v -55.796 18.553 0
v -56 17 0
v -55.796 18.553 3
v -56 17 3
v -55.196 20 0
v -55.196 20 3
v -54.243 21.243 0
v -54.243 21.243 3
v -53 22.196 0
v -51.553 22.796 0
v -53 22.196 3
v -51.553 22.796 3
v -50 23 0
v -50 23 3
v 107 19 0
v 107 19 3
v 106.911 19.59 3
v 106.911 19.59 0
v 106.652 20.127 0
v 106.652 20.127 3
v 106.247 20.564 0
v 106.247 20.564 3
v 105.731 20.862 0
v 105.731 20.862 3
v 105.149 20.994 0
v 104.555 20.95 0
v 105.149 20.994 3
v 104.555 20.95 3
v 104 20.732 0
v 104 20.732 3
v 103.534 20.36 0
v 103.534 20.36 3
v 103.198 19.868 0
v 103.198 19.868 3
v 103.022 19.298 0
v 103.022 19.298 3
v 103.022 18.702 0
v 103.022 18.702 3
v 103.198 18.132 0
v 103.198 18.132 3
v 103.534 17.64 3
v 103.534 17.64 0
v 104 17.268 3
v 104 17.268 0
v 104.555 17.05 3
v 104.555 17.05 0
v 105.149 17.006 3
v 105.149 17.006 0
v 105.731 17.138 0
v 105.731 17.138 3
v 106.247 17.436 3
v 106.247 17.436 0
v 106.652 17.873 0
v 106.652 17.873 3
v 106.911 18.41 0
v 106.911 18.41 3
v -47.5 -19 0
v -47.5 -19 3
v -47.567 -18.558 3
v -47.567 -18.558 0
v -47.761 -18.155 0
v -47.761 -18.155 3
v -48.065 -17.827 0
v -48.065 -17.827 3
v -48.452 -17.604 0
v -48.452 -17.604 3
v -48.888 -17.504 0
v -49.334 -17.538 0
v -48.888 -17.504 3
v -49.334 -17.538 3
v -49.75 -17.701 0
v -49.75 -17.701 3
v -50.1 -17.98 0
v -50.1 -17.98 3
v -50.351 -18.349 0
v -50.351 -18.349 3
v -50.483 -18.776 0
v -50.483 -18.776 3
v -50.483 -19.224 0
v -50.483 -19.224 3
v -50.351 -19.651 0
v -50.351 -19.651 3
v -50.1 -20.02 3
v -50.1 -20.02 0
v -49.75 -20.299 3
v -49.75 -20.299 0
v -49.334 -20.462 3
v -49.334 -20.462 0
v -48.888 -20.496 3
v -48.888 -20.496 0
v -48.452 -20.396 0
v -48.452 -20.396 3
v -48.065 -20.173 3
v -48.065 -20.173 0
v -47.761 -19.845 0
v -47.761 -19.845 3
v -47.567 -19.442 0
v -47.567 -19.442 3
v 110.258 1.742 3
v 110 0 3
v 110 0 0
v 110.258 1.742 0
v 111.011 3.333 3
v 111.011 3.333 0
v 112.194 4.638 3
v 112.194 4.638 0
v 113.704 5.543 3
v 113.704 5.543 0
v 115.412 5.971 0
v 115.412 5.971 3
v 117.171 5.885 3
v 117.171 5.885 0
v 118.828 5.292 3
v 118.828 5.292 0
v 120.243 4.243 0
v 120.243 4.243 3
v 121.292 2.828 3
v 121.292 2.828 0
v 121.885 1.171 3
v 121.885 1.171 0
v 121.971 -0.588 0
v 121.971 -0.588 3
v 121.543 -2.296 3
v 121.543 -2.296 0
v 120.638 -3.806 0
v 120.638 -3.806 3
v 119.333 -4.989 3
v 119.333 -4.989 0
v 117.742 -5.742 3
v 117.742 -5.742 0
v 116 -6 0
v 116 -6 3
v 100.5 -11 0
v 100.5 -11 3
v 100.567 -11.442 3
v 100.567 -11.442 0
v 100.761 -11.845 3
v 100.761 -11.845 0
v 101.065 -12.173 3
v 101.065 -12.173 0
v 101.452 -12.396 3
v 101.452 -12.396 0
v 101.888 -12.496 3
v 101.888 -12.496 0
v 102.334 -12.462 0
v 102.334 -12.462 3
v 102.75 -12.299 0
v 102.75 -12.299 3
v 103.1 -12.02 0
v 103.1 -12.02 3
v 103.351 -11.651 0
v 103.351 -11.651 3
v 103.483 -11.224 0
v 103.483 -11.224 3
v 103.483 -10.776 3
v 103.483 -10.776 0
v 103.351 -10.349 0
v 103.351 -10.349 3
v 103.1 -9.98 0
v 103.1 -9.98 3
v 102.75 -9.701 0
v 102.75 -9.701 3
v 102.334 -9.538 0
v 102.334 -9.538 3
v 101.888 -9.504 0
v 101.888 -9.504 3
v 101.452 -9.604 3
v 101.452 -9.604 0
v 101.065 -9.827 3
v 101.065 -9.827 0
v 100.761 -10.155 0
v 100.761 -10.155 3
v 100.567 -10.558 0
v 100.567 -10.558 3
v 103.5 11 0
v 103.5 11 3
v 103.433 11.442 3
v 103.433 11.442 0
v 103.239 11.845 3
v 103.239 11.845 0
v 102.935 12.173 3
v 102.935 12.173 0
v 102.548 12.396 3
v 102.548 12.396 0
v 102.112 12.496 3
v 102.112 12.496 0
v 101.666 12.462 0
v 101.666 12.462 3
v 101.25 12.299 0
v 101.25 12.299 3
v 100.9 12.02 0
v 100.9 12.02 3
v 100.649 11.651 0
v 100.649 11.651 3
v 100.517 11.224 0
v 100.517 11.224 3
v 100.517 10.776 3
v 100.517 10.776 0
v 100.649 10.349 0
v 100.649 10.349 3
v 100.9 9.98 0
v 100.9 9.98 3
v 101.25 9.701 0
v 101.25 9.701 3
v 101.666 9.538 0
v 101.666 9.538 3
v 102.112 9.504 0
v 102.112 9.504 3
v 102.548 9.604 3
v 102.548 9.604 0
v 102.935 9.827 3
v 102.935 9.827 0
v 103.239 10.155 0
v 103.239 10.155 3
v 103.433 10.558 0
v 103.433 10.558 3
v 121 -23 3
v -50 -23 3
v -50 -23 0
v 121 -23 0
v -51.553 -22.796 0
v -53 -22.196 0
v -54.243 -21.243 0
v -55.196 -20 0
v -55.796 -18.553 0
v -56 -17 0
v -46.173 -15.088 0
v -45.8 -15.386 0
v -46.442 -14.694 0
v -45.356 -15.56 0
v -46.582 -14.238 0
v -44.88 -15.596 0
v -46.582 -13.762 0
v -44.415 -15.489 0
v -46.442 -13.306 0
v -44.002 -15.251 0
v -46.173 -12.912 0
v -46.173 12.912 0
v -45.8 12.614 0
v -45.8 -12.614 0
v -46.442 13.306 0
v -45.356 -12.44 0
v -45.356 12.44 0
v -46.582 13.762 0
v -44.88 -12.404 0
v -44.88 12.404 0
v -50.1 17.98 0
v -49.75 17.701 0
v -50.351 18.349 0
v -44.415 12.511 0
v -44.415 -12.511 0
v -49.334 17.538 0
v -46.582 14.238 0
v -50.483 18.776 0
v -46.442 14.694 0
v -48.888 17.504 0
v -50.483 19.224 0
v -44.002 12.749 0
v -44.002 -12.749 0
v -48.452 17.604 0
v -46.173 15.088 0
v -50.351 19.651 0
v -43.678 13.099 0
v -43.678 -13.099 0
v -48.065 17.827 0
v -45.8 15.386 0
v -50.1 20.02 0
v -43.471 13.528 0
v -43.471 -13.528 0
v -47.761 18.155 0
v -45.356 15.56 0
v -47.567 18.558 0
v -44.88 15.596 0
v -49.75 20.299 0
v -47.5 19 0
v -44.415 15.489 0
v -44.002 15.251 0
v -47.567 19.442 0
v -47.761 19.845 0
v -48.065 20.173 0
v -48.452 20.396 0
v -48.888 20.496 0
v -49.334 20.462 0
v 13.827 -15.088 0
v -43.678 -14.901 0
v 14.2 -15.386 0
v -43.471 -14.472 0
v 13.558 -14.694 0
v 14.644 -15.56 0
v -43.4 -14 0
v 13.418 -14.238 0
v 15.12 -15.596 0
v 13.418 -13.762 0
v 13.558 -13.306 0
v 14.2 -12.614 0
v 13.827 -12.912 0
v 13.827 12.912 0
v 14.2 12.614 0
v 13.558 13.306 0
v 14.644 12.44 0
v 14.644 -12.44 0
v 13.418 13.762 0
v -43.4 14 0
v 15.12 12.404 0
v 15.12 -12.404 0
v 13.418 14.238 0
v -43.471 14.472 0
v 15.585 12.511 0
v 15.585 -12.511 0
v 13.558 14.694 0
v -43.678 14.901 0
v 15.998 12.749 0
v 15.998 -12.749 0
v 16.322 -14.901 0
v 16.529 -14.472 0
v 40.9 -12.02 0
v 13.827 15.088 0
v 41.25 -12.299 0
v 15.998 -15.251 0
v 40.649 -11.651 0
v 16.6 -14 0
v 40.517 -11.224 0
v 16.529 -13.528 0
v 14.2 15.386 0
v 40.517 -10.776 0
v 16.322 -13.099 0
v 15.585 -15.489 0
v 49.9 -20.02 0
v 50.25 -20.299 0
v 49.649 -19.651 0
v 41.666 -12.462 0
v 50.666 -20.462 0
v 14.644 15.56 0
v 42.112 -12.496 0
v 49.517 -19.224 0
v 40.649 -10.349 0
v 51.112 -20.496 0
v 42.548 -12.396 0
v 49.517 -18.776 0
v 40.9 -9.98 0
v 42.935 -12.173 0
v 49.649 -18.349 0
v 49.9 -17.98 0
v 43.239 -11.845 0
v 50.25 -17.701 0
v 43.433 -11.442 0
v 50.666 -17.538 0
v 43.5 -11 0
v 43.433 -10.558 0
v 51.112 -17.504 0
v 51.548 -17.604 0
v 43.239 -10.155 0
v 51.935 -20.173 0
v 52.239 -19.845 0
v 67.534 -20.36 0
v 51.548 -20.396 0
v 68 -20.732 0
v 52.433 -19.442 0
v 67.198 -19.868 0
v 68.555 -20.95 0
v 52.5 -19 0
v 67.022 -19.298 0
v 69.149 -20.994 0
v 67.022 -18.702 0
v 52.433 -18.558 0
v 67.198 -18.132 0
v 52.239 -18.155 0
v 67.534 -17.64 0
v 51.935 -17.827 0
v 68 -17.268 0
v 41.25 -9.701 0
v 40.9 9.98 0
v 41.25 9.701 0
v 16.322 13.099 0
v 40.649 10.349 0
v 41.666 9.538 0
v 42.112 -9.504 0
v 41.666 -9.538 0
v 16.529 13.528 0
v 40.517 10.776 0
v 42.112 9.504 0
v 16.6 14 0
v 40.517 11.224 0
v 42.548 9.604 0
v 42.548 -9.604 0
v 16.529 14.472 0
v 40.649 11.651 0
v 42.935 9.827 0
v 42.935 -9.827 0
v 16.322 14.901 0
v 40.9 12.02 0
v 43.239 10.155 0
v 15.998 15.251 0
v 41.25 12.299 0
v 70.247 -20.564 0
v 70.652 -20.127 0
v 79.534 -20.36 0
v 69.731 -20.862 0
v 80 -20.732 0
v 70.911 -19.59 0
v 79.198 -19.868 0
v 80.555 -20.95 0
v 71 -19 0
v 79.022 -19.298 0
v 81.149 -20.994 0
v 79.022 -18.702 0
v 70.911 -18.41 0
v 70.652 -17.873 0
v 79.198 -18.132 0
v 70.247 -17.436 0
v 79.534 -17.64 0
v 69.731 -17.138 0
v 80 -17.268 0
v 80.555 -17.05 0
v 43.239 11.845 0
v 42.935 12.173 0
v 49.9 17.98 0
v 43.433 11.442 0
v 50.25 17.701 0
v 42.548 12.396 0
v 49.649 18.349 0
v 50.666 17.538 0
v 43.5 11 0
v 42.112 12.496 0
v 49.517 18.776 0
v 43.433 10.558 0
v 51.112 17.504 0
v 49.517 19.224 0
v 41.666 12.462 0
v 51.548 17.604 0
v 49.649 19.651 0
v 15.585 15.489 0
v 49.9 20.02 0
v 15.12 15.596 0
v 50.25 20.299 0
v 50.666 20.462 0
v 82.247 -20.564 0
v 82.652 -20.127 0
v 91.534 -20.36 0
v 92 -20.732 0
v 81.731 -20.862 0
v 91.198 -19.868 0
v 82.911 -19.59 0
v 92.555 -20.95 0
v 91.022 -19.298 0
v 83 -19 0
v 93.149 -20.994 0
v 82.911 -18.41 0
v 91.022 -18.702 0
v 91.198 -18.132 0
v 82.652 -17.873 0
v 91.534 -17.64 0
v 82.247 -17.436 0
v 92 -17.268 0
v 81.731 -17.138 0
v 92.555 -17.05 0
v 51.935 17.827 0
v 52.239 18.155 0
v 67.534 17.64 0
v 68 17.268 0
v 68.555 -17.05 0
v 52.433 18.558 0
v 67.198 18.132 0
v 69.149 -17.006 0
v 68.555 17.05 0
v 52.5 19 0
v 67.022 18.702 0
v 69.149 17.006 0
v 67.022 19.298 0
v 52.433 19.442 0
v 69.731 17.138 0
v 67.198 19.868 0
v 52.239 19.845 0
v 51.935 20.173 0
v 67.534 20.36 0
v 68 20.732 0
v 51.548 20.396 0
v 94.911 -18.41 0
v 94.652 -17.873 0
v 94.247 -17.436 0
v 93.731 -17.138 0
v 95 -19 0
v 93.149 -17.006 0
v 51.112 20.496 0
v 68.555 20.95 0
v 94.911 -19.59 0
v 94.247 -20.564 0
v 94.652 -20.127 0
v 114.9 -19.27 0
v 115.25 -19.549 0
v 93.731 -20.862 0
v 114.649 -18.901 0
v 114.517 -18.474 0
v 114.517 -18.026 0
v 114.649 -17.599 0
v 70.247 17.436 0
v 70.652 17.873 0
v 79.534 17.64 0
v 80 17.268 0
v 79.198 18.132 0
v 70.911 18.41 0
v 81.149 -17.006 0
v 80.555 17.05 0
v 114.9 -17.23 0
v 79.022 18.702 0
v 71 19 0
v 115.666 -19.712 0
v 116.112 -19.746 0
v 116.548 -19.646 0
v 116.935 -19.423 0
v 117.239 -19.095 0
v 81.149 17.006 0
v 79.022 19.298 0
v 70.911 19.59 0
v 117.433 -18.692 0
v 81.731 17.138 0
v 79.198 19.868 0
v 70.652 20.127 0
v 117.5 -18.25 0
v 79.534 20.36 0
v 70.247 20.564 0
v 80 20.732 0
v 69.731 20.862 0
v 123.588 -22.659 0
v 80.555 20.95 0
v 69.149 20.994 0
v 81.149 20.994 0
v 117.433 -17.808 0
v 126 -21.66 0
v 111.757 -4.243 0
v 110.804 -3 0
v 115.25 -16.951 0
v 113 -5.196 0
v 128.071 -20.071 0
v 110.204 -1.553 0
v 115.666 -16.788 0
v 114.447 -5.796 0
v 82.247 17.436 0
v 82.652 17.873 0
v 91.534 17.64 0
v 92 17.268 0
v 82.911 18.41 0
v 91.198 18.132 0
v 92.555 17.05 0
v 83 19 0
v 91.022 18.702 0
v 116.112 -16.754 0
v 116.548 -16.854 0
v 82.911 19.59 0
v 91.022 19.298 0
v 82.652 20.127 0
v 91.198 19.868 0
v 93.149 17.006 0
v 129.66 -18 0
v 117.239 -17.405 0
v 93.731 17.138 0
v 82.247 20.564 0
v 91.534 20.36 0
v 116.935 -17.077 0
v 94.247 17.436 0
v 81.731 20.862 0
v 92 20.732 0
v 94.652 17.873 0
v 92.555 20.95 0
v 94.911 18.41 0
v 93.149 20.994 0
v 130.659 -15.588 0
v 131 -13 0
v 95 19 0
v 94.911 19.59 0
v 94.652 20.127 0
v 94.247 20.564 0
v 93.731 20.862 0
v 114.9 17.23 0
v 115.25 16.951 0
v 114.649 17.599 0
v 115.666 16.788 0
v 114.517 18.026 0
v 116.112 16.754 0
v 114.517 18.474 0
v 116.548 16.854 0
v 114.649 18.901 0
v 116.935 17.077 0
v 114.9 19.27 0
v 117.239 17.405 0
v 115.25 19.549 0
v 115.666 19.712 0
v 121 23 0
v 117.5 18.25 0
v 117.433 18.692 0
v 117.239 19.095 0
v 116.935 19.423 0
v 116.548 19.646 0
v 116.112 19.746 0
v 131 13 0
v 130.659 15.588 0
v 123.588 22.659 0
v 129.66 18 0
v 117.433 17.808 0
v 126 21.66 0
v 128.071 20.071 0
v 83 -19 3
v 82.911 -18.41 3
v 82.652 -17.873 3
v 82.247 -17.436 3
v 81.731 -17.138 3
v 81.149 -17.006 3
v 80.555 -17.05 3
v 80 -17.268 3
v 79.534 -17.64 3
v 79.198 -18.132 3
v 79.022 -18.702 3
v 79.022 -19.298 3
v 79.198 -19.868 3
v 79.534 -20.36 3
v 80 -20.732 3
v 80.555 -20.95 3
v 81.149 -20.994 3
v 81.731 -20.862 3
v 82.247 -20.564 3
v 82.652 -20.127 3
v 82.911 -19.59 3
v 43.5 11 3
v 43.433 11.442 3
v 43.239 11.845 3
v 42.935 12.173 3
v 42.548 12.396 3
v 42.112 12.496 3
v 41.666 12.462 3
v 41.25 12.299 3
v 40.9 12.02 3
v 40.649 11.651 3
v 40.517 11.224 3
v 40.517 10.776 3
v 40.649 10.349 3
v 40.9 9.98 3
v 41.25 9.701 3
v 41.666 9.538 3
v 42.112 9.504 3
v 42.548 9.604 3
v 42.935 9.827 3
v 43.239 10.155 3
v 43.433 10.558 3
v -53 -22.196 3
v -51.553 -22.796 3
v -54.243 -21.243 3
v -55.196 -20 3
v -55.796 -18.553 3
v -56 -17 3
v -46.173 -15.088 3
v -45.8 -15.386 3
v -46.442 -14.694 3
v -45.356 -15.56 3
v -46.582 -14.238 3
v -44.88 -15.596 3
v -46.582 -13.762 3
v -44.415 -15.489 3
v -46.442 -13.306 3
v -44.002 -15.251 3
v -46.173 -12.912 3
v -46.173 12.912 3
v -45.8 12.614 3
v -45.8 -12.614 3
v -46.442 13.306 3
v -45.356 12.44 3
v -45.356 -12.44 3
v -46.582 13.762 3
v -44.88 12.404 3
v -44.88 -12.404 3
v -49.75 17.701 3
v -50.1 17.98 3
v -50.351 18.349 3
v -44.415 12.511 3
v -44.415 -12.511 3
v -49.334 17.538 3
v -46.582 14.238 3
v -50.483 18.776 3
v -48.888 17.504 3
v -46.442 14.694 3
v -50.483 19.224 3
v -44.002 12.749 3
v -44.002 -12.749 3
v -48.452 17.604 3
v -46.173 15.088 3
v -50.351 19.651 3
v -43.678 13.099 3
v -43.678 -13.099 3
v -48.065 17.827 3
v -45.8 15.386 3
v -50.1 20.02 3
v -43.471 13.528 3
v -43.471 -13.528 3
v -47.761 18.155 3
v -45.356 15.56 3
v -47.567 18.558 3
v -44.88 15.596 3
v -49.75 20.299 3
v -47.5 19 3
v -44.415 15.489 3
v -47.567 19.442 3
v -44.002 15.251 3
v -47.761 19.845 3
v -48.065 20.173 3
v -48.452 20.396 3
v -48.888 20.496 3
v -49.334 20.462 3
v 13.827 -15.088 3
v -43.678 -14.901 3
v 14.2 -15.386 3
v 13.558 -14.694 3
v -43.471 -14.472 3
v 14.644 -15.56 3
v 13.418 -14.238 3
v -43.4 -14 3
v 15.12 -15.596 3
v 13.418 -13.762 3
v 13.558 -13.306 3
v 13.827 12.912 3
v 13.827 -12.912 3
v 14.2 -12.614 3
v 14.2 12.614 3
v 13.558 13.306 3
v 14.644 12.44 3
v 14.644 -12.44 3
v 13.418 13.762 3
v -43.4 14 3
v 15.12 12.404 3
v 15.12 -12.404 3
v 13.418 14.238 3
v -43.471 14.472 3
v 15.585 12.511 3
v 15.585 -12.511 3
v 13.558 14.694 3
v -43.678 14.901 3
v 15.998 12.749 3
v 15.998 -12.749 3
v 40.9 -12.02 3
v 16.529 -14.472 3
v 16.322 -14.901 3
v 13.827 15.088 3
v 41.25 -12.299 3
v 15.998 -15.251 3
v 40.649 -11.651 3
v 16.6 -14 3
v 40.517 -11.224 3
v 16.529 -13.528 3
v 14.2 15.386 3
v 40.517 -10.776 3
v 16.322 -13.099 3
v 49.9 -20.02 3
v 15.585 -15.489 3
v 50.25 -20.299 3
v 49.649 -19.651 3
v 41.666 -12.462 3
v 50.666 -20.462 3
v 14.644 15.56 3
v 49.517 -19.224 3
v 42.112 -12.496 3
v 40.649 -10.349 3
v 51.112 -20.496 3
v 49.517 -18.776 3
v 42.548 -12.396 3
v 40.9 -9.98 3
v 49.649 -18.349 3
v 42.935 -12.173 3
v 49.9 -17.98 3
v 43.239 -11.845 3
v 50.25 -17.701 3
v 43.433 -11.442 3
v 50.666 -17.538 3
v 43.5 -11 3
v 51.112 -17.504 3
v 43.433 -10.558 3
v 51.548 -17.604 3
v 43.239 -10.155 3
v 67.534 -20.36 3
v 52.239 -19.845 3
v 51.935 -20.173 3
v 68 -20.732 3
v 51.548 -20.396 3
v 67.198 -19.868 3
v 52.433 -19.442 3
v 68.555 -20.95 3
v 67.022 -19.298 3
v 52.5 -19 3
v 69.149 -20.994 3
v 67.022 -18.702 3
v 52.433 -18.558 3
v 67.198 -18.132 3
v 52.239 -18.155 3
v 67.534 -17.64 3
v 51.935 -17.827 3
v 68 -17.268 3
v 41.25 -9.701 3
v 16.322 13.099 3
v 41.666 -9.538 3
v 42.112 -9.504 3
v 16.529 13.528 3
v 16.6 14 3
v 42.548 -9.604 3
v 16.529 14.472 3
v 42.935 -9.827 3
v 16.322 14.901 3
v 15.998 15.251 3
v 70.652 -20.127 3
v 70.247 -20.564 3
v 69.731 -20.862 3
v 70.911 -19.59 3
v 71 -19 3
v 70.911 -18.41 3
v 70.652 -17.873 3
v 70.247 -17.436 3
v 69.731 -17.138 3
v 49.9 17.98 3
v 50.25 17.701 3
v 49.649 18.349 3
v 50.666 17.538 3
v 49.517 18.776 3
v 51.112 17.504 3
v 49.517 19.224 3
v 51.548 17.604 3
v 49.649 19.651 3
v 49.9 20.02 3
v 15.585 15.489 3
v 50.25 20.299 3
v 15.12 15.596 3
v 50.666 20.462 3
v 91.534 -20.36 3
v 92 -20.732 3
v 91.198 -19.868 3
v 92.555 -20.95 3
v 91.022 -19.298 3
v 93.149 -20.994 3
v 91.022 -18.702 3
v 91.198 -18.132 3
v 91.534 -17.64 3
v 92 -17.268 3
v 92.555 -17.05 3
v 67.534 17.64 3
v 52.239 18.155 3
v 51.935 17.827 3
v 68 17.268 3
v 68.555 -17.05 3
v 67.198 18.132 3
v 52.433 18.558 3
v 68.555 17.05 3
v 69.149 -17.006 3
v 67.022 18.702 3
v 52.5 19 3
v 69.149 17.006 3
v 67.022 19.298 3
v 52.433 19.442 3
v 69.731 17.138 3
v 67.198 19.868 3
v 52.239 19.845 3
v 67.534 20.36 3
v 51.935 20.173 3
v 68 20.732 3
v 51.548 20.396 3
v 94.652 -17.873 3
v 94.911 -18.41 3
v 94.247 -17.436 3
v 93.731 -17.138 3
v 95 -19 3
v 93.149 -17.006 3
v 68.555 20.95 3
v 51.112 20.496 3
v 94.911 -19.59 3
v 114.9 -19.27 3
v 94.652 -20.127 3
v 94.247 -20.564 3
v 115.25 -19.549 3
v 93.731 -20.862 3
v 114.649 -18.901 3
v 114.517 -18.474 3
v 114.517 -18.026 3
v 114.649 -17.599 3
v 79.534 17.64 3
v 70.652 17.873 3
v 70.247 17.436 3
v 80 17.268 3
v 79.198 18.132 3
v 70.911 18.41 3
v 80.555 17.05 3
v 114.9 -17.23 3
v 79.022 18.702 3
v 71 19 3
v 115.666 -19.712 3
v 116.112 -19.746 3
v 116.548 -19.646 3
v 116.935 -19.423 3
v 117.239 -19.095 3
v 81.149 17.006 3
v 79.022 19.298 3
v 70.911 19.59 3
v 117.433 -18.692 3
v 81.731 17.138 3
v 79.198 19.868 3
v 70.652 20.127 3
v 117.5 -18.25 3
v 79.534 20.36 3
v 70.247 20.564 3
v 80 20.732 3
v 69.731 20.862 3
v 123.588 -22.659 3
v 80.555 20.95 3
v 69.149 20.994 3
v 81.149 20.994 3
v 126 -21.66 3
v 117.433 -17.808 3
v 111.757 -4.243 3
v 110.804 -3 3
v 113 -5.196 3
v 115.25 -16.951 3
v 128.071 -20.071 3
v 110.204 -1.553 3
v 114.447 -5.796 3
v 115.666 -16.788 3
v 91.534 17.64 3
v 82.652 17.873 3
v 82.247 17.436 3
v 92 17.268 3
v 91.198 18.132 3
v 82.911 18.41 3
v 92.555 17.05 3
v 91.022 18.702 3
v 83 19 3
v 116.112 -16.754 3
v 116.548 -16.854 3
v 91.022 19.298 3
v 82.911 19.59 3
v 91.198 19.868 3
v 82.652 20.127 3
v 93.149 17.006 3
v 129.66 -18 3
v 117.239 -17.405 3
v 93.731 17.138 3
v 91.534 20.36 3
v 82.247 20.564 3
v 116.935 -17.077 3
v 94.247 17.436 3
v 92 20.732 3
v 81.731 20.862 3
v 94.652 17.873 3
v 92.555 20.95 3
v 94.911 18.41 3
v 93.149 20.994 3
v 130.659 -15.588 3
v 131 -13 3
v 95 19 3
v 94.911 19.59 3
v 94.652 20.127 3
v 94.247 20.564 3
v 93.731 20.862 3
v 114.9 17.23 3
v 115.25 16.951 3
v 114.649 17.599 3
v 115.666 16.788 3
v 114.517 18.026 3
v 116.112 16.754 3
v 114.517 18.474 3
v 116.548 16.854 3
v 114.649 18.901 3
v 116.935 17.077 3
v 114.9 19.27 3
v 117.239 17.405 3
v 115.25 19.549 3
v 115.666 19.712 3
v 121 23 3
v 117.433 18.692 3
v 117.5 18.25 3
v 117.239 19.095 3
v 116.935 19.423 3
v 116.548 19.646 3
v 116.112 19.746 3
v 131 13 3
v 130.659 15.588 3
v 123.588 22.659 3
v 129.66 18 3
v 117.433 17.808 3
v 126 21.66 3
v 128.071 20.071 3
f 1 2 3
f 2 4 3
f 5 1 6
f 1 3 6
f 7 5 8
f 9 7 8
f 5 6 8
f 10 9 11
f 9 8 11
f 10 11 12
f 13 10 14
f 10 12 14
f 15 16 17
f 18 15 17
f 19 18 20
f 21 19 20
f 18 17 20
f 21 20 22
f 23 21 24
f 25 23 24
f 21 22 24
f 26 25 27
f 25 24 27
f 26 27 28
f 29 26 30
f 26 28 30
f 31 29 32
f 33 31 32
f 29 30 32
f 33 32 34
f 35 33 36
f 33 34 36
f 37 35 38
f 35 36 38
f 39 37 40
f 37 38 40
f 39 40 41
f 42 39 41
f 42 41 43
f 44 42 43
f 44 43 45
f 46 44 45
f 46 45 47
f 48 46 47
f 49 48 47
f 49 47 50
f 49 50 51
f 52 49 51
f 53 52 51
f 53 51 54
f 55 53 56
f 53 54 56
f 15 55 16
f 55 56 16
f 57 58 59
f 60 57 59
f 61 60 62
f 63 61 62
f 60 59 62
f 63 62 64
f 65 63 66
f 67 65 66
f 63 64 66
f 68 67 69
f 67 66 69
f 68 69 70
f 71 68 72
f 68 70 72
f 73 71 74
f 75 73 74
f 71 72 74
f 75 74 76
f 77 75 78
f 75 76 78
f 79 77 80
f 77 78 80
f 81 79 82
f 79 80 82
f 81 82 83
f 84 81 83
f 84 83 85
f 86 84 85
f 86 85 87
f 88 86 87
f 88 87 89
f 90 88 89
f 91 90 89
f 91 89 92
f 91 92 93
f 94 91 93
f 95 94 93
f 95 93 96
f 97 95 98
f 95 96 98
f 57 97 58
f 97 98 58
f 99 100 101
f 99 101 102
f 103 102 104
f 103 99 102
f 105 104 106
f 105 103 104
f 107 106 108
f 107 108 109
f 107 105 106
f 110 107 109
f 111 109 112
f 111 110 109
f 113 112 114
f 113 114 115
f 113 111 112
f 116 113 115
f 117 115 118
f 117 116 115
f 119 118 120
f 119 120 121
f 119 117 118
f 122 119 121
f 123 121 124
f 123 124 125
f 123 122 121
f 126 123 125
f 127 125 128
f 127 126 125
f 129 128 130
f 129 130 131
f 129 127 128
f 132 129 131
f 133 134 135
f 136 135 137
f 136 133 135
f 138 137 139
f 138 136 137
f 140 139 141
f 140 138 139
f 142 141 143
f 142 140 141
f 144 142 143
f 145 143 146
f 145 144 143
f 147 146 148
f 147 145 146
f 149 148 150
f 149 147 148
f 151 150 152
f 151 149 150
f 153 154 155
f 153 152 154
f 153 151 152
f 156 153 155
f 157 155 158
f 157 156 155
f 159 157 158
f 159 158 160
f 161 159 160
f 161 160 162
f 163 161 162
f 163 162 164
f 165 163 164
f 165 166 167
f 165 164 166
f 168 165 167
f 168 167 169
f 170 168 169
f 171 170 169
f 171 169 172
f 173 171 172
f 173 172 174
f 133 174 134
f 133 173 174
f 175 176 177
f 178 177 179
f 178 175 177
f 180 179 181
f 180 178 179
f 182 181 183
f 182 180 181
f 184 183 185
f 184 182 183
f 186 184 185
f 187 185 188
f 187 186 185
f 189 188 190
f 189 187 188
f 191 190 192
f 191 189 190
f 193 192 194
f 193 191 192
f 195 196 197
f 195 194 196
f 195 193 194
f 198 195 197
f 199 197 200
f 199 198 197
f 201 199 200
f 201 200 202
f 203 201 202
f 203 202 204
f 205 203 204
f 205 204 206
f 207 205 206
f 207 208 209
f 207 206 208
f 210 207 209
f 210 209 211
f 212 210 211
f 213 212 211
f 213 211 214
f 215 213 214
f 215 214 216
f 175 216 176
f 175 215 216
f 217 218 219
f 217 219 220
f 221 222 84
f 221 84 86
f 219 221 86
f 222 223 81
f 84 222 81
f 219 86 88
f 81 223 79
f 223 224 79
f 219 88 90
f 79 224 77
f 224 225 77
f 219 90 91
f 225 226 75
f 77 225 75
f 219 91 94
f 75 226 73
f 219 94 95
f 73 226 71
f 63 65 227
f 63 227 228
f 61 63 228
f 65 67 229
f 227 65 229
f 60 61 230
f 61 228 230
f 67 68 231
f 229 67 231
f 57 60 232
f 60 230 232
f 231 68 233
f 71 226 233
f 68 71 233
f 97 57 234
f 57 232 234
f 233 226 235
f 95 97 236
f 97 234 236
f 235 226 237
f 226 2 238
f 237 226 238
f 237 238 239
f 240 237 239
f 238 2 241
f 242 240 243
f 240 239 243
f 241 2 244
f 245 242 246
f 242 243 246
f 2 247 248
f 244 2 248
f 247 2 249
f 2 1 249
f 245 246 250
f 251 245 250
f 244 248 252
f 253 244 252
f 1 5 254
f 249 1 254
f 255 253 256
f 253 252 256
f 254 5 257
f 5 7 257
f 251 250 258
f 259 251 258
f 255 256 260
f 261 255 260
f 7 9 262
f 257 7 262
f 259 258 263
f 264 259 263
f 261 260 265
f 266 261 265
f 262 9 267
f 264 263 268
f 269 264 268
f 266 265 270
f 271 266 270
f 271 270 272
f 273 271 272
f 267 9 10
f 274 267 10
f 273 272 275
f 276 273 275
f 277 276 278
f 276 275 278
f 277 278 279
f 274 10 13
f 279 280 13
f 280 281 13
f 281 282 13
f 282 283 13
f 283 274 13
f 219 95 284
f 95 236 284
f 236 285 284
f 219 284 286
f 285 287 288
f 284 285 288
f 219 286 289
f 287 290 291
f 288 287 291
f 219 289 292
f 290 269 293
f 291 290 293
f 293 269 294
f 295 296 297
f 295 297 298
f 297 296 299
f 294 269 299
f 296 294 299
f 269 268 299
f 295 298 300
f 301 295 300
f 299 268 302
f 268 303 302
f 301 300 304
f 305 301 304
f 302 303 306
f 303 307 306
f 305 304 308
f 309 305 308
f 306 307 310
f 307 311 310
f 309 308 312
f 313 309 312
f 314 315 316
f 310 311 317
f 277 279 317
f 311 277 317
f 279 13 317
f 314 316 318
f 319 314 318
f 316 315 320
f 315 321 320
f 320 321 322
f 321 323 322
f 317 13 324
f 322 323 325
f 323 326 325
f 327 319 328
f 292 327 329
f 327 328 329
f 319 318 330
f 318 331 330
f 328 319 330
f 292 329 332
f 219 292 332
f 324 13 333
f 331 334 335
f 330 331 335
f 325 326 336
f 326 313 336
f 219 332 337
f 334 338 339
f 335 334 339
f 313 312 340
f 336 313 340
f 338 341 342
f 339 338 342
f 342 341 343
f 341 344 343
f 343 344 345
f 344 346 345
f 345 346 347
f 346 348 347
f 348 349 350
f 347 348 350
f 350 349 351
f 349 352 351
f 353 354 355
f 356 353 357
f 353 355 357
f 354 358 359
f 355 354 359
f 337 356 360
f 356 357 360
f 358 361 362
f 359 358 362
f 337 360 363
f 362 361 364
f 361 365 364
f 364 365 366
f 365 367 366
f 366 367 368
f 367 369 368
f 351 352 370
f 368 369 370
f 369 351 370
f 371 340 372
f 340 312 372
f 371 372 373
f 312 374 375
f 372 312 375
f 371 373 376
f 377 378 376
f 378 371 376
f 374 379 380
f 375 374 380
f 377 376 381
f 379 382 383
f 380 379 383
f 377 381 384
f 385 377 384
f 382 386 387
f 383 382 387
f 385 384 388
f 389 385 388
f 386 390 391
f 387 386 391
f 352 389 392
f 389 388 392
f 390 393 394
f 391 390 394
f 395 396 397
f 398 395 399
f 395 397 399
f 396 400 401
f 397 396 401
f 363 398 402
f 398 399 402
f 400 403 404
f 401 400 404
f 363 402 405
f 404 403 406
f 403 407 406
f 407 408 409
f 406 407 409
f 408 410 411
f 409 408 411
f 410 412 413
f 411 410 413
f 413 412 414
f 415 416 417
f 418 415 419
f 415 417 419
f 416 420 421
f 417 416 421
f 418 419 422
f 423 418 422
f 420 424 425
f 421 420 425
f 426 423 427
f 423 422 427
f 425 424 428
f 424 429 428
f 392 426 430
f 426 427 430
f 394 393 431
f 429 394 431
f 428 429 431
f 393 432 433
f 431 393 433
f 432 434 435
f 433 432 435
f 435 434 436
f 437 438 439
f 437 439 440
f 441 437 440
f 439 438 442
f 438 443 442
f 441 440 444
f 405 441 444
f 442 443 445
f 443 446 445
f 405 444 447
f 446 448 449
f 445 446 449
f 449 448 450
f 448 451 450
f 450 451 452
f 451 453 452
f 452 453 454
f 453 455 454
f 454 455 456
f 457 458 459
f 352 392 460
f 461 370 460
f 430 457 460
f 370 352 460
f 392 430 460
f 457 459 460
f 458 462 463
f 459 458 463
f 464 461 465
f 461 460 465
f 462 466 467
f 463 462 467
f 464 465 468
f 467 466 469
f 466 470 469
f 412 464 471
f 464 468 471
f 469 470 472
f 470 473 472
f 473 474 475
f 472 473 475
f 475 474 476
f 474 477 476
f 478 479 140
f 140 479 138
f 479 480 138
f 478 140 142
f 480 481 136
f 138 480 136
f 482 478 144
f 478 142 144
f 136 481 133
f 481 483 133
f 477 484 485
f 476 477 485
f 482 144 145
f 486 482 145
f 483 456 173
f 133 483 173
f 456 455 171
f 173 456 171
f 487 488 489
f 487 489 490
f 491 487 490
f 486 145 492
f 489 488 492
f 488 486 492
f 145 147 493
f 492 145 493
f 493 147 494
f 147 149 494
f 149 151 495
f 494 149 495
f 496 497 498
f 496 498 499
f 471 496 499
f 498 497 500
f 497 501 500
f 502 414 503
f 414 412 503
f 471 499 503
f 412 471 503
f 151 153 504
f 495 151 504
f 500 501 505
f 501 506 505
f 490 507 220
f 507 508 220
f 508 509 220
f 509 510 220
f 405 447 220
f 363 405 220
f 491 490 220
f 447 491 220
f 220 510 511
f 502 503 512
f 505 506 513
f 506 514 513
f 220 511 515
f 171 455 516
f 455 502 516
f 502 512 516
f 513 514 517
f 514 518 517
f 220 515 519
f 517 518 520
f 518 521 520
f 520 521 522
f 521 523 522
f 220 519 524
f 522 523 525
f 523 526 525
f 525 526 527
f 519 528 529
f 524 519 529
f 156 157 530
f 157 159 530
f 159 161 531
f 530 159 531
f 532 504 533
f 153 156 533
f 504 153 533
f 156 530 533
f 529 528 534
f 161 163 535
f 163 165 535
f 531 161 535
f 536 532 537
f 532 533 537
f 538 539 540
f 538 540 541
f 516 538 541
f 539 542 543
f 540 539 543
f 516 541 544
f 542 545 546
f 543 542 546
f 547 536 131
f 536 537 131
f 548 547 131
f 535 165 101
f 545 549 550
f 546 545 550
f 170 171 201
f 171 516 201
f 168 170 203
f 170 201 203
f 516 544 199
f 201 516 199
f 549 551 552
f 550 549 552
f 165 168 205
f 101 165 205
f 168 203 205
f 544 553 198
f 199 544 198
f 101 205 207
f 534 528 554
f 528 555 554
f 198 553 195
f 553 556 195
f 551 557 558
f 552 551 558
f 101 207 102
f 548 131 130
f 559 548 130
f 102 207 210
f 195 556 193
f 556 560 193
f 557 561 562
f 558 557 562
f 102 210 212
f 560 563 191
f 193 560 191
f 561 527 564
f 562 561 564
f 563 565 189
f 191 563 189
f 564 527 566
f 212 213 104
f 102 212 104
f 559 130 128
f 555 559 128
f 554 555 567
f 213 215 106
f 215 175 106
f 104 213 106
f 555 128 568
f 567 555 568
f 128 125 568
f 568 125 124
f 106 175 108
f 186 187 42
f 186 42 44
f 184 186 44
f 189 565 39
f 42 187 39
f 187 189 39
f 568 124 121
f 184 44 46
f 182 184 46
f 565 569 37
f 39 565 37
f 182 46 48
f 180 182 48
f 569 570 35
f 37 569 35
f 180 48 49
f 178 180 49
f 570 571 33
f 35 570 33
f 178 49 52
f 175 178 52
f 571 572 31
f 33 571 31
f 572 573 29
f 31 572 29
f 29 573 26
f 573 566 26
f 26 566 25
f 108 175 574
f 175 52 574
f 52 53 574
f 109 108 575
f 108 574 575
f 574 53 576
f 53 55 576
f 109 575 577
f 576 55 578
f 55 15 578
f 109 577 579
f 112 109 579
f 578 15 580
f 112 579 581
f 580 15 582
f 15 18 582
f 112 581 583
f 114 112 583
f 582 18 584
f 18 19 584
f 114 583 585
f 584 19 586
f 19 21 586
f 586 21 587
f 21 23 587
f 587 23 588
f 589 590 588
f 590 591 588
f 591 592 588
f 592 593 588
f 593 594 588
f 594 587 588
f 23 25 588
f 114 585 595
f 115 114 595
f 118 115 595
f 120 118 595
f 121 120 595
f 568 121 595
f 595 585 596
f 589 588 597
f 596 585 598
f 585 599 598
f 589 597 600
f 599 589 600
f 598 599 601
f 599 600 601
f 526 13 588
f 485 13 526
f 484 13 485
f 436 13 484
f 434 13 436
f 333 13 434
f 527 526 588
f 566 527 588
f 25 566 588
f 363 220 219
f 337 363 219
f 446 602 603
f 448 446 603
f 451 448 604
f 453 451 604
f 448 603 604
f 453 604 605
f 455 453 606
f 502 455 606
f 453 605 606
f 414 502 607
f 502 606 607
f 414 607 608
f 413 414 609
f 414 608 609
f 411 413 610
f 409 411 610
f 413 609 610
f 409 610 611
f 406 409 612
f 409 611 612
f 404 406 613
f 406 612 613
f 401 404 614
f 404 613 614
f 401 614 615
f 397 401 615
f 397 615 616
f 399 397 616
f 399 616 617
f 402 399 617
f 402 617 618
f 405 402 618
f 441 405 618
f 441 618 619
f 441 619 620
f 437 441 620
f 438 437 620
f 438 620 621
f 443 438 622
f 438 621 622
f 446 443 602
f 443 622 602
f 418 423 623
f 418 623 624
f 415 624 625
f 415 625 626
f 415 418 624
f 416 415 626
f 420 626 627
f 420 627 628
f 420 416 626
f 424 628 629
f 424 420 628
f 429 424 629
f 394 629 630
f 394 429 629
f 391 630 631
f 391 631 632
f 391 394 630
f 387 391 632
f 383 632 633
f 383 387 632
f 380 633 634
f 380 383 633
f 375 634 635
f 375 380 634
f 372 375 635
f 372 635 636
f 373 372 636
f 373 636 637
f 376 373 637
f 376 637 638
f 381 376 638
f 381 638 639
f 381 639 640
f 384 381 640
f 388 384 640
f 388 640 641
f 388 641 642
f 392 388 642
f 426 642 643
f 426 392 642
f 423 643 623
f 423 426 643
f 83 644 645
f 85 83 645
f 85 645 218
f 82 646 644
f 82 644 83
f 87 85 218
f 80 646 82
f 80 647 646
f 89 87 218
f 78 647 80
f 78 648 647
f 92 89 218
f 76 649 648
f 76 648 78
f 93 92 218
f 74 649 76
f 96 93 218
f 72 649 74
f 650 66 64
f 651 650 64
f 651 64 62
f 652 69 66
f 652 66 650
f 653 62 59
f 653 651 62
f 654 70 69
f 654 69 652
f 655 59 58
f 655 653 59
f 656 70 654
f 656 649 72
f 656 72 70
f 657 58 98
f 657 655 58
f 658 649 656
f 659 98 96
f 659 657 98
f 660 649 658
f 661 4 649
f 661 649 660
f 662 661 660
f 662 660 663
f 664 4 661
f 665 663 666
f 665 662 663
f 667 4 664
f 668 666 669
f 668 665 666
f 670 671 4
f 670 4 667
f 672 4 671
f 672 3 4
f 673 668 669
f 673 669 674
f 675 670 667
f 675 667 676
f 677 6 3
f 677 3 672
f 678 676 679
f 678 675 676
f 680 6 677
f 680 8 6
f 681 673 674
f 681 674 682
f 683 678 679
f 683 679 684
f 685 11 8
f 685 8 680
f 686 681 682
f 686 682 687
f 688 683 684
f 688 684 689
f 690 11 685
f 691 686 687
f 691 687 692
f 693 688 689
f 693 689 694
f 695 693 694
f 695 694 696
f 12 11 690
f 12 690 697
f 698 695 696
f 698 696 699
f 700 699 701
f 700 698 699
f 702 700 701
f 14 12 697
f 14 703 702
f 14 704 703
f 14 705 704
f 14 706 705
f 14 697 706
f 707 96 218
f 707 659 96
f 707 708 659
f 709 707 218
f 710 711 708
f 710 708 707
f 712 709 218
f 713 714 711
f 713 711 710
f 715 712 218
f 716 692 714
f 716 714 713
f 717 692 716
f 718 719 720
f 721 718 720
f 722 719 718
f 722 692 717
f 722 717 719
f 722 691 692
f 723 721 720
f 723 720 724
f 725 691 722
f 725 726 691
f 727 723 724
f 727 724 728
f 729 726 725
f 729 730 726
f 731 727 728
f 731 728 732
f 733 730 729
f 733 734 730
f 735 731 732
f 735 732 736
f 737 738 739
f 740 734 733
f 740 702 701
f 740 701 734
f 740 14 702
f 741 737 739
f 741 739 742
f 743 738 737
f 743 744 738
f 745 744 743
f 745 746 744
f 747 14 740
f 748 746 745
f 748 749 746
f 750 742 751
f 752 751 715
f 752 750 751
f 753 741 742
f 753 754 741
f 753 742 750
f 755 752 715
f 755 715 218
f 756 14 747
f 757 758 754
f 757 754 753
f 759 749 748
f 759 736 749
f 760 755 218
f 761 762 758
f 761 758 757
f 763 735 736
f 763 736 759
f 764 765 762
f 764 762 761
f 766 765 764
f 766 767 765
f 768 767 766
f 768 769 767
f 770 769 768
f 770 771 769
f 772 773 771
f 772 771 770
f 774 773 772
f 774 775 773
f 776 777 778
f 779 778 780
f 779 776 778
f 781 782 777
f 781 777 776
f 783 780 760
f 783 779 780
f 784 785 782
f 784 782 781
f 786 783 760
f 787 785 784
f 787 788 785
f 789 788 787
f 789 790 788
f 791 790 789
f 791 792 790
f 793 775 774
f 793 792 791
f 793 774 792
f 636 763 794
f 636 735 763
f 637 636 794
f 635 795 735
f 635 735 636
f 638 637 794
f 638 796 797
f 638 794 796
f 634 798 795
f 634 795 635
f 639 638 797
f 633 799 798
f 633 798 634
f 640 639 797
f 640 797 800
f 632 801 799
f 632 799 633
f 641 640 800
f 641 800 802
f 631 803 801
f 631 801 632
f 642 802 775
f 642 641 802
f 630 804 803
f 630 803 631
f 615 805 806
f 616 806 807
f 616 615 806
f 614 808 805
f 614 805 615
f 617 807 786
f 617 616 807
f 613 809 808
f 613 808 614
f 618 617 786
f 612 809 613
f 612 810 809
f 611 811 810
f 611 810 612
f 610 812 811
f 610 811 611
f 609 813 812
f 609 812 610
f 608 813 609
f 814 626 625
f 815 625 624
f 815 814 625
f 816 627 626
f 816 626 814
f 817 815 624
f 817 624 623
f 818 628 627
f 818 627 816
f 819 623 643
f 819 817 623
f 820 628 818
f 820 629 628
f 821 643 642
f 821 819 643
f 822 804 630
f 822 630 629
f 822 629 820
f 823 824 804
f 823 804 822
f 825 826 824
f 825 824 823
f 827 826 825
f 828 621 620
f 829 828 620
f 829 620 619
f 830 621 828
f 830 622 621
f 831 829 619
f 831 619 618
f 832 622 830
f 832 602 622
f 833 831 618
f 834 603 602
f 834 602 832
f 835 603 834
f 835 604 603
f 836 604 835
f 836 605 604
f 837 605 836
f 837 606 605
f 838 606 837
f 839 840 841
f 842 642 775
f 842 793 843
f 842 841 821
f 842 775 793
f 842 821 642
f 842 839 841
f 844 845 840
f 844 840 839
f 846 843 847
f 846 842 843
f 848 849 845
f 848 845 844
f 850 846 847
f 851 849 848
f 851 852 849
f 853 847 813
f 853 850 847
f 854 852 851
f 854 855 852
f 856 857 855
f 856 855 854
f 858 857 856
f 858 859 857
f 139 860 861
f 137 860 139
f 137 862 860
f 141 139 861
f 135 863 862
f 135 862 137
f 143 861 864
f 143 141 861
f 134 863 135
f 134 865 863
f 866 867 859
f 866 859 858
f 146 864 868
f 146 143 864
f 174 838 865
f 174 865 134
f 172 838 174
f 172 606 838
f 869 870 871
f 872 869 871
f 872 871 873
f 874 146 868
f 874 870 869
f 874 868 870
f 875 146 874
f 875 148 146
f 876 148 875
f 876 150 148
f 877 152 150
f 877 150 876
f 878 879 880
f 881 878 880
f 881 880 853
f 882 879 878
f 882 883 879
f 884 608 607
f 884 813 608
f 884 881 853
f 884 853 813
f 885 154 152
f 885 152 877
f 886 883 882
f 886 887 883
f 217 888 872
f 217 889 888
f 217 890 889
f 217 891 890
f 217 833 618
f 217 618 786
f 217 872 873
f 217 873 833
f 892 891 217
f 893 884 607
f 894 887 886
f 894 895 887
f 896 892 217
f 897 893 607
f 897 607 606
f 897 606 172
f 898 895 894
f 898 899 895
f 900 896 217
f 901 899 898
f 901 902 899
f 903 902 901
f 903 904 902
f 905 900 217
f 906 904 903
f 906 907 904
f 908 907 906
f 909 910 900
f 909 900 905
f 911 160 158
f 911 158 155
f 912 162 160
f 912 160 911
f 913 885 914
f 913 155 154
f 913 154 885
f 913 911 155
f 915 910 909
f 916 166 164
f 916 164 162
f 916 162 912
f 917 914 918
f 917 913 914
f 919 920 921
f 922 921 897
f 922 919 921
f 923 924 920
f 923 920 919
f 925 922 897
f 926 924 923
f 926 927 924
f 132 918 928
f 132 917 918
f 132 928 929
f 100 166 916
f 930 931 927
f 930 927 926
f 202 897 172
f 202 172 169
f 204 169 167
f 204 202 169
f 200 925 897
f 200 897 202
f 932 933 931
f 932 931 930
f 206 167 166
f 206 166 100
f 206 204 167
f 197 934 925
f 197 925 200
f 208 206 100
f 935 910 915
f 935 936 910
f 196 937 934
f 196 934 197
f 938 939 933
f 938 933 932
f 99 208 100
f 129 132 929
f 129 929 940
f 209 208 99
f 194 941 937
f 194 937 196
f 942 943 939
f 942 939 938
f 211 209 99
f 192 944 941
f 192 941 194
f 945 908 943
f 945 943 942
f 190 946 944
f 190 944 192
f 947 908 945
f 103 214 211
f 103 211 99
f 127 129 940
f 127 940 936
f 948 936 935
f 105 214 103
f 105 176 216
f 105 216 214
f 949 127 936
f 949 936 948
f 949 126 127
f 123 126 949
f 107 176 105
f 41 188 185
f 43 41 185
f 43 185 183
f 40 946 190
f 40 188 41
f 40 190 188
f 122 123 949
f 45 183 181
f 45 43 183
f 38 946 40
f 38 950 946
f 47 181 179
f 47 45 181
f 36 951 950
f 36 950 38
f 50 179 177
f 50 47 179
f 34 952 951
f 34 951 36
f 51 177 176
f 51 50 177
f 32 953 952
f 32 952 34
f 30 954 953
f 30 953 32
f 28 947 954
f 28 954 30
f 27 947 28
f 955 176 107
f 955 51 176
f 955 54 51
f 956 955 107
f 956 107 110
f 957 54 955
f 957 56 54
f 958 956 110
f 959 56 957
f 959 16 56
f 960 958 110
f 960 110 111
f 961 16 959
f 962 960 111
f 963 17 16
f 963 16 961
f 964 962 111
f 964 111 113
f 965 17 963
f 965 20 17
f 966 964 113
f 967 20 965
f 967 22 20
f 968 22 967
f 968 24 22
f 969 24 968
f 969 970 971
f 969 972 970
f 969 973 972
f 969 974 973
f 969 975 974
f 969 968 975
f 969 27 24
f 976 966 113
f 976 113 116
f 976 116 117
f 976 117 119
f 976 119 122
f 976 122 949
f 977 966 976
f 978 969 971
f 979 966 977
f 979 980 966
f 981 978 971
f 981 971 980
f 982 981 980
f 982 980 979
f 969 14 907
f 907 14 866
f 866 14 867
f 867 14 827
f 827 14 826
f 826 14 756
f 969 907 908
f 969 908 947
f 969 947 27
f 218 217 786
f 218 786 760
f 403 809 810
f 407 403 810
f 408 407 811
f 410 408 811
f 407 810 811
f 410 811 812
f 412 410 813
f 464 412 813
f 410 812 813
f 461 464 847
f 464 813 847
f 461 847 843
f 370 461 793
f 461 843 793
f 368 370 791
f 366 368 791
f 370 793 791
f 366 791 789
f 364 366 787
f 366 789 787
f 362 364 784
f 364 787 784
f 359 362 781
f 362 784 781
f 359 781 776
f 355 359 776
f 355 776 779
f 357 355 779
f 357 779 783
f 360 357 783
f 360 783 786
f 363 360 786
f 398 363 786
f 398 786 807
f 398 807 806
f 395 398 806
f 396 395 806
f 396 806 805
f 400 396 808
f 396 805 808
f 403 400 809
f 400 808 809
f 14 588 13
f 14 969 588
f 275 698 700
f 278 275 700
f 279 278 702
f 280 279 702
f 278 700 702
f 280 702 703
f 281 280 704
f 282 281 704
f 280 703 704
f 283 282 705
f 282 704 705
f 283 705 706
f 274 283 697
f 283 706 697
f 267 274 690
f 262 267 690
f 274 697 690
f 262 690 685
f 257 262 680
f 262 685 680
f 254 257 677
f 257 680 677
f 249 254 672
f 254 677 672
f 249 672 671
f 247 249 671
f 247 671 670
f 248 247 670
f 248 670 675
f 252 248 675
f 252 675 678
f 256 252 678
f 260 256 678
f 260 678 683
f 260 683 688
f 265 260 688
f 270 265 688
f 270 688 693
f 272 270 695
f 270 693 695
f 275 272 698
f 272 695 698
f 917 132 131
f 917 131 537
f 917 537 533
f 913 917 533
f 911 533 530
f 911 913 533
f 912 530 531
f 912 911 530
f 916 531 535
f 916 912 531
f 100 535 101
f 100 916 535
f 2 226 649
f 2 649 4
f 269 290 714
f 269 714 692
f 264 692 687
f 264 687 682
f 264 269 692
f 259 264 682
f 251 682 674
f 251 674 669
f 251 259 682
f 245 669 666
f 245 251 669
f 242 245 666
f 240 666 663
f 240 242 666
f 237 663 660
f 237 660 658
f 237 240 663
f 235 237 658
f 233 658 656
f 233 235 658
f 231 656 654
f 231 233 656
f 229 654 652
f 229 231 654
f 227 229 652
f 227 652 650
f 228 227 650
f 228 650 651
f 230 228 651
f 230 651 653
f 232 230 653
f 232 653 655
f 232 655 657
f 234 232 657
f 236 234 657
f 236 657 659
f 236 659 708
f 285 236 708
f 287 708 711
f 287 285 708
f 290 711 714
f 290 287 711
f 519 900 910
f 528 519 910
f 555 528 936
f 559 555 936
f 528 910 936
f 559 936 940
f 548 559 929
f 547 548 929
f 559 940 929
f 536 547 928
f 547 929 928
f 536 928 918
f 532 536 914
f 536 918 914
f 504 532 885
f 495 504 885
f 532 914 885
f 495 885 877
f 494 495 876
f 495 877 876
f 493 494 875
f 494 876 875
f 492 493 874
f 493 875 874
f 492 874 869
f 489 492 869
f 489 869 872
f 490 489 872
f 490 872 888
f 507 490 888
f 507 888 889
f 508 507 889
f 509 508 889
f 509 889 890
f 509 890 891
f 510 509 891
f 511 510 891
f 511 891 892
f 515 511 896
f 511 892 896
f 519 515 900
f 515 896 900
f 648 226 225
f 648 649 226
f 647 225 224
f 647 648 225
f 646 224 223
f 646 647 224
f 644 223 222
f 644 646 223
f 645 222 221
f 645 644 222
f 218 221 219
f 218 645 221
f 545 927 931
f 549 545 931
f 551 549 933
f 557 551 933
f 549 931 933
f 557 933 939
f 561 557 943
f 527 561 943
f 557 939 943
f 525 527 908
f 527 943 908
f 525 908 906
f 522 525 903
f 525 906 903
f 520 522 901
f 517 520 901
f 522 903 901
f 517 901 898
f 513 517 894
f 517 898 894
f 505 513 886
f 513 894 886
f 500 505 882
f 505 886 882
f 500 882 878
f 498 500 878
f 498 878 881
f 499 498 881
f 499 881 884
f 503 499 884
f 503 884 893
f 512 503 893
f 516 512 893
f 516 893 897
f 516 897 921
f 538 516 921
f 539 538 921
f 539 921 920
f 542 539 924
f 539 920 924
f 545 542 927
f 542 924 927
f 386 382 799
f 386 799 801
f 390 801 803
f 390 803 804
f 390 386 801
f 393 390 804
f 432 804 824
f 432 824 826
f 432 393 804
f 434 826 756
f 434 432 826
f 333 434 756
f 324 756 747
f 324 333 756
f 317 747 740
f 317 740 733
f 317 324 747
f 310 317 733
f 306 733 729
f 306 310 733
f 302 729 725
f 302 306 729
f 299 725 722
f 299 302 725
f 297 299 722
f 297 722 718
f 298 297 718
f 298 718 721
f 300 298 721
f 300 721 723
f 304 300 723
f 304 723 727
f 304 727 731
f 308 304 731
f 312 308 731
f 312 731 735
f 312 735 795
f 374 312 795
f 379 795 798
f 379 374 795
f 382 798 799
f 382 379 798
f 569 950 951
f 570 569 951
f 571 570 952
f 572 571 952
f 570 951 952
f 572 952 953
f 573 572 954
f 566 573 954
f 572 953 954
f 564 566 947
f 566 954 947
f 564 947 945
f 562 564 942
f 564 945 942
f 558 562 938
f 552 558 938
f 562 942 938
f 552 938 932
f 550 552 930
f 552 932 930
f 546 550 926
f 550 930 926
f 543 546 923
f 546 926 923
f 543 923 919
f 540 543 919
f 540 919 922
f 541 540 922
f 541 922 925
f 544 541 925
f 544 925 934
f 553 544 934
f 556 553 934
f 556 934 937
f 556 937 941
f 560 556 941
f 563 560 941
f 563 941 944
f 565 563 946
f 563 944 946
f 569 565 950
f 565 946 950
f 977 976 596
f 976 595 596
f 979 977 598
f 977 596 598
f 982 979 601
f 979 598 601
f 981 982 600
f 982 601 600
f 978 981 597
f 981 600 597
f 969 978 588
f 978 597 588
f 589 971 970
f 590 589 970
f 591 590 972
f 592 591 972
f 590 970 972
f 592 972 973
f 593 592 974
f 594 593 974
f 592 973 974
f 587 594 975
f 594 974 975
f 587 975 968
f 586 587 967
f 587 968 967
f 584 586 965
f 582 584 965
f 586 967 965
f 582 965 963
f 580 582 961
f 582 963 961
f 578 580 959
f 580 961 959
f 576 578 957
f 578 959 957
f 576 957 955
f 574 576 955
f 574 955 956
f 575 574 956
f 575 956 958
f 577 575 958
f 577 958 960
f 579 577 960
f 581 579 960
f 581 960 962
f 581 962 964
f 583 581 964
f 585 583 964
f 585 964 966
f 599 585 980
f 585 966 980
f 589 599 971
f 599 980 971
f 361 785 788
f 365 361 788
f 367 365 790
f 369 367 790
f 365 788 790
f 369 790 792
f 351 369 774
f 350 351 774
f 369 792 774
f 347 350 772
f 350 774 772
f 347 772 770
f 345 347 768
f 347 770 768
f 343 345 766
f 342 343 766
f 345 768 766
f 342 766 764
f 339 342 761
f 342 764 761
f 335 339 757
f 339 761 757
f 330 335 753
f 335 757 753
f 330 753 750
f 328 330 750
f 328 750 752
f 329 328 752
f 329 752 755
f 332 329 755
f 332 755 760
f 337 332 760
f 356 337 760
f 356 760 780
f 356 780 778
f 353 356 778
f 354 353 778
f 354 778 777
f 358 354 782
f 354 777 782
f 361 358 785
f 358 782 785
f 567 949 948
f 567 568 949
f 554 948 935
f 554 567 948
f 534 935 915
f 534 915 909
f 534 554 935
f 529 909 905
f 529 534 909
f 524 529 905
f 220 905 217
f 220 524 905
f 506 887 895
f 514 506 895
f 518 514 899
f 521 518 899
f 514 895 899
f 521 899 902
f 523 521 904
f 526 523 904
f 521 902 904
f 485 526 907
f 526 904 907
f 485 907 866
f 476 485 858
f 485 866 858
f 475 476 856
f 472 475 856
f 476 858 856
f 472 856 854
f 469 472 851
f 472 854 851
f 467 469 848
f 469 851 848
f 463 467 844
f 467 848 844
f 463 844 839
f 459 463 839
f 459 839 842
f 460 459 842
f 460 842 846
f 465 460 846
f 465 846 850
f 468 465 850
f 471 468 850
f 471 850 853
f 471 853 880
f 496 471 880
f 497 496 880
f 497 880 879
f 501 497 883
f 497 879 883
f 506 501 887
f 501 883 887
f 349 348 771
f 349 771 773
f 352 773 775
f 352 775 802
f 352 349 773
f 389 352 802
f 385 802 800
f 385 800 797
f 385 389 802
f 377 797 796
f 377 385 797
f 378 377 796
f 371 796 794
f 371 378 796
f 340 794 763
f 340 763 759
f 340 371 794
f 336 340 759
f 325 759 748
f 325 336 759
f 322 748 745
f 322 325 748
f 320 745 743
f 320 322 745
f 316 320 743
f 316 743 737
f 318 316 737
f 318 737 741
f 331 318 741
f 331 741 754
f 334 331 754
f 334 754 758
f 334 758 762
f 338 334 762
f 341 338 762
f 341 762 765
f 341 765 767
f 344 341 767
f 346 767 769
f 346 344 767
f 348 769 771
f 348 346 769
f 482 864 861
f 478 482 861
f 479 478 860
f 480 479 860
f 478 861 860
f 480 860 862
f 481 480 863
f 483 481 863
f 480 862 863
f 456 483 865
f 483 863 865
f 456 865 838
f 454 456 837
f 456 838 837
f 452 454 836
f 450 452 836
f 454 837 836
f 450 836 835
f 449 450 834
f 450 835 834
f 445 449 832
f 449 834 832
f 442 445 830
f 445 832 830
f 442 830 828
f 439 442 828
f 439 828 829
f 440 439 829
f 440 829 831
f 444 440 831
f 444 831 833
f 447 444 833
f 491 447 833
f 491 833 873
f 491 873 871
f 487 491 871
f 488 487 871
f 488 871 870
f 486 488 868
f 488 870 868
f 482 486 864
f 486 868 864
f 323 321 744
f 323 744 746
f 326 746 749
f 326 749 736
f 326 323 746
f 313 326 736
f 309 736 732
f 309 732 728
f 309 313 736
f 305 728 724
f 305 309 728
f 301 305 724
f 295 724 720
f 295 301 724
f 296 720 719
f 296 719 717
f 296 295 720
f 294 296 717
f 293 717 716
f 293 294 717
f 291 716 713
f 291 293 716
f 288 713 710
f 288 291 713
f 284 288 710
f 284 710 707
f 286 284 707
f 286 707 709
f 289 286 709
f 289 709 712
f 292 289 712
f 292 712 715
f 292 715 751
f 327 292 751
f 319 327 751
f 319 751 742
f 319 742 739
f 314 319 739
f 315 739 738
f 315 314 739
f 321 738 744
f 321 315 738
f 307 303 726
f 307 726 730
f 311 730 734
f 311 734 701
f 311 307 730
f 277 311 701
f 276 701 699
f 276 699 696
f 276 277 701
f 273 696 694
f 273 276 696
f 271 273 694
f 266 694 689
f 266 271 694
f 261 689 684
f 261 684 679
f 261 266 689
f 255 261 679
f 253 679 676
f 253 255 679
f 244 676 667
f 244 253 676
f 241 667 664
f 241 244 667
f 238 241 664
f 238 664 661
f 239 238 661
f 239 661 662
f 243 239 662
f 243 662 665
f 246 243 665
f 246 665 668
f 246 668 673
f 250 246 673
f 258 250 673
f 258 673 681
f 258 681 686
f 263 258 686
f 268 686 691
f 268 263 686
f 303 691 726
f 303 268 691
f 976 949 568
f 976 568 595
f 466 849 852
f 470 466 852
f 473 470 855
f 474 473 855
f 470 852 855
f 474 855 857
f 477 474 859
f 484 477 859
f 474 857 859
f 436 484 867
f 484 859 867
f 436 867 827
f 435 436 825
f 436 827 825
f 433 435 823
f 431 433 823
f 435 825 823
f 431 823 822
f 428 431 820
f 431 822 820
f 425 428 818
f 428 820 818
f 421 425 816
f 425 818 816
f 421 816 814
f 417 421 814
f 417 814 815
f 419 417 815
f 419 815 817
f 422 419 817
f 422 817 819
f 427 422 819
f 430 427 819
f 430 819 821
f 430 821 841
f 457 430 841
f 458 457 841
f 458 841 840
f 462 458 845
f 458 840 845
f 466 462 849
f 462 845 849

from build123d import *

# Parameters (mm, degrees)
BOSS_EXTRUDE1_OUTLINE_W   = 142
BOSS_EXTRUDE1_OUTLINE_H   = 46
BOSS_EXTRUDE1_OUTLINE_R   = 1.6
BOSS_EXTRUDE1_OUTLINE_R_2 = 1.5
BOSS_EXTRUDE1_DEPTH       = 3
FILLET4_R                 = 6
SKETCH3_R                 = 2
SKETCH3_R_2               = 1.5
BOSS_EXTRUDE2_DEPTH       = 3
SKETCH3_7_R               = 1.5
SKETCH3_7_R_2             = 2
CUT_EXTRUDE1_DEPTH        = 3
FILLET5_R                 = 10
SKETCH2_3_R               = 1.5
CUT_EXTRUDE2_DEPTH        = 10


# Read off the part's stored shape, not the designer's step: Boss-Extrude1
with BuildPart() as part:
    # Boss-Extrude1 outline → Boss-Extrude1 (new body)
    with BuildSketch(Plane.XY):
        with Locations((15, 0)):
            Rectangle(BOSS_EXTRUDE1_OUTLINE_W, BOSS_EXTRUDE1_OUTLINE_H)
        with Locations((-45, -14)):
            Circle(BOSS_EXTRUDE1_OUTLINE_R, mode=Mode.SUBTRACT)
        with Locations((15, -14)):
            Circle(BOSS_EXTRUDE1_OUTLINE_R, mode=Mode.SUBTRACT)
        with Locations((42, -11)):
            Circle(BOSS_EXTRUDE1_OUTLINE_R_2, mode=Mode.SUBTRACT)
        with Locations((-45, 14)):
            Circle(BOSS_EXTRUDE1_OUTLINE_R, mode=Mode.SUBTRACT)
        with Locations((42, 11)):
            Circle(BOSS_EXTRUDE1_OUTLINE_R_2, mode=Mode.SUBTRACT)
        with Locations((15, 14)):
            Circle(BOSS_EXTRUDE1_OUTLINE_R, mode=Mode.SUBTRACT)
    extrude(amount=BOSS_EXTRUDE1_DEPTH)

    # Fillet4
    fillet4_edges = [part.edges().sort_by_distance(p)[0] for p in [
        (-56, -23, 1.5),
        (-56, 23, 1.5),
    ]]
    fillet(fillet4_edges, radius=FILLET4_R)

    # Sketch3 → Boss-Extrude2 (add)
    with BuildSketch(Plane.XY.offset(3)):
        Polygon((131, -23), (131, 23), (86, 23), (86, -19), (86, -23), align=None)
        with Locations((93, -19)):
            Circle(SKETCH3_R, mode=Mode.SUBTRACT)
        with Locations((116, -18.25)):
            Circle(SKETCH3_R_2, mode=Mode.SUBTRACT)
        with BuildLine():
            ThreePointArc((110, 0), (120.242640687, 4.242640687), (116, -6))
            ThreePointArc((116, -6), (111.757359313, -4.242640687), (110, 0))
        make_face(mode=Mode.SUBTRACT)
        with Locations((105, 19)):
            Circle(SKETCH3_R, mode=Mode.SUBTRACT)
        with Locations((116, 18.25)):
            Circle(SKETCH3_R_2, mode=Mode.SUBTRACT)
        with Locations((93, 19)):
            Circle(SKETCH3_R, mode=Mode.SUBTRACT)
    extrude(amount=-BOSS_EXTRUDE2_DEPTH)

    # Sketch3<7> → Cut-Extrude1 (cut)
    with BuildSketch(Plane.XY.offset(3)):
        with Locations((51, 19)):
            Circle(SKETCH3_7_R)
        with Locations((-49, 19)):
            Circle(SKETCH3_7_R)
        with Locations((69, -19)):
            Circle(SKETCH3_7_R_2)
        with Locations((81, -19)):
            Circle(SKETCH3_7_R_2)
        with Locations((69, 19)):
            Circle(SKETCH3_7_R_2)
        with Locations((81, 19)):
            Circle(SKETCH3_7_R_2)
        with Locations((-49, -19)):
            Circle(SKETCH3_7_R)
        with Locations((51, -19)):
            Circle(SKETCH3_7_R)
    extrude(amount=-CUT_EXTRUDE1_DEPTH, mode=Mode.SUBTRACT)

    # Fillet5
    fillet5_edges = [part.edges().sort_by_distance(p)[0] for p in [
        (131, 23, 1.5),
        (131, -23, 1.5),
    ]]
    fillet(fillet5_edges, radius=FILLET5_R)

    # Sketch2<3> → Cut-Extrude2 (cut)
    with BuildSketch(Plane.XY):
        with Locations((102, 11)):
            Circle(SKETCH2_3_R)
        with Locations(Location((102, -11, 0), (0, 0, 180))):
            Circle(SKETCH2_3_R)
    extrude(amount=CUT_EXTRUDE2_DEPTH, mode=Mode.SUBTRACT)


solid = part.part
